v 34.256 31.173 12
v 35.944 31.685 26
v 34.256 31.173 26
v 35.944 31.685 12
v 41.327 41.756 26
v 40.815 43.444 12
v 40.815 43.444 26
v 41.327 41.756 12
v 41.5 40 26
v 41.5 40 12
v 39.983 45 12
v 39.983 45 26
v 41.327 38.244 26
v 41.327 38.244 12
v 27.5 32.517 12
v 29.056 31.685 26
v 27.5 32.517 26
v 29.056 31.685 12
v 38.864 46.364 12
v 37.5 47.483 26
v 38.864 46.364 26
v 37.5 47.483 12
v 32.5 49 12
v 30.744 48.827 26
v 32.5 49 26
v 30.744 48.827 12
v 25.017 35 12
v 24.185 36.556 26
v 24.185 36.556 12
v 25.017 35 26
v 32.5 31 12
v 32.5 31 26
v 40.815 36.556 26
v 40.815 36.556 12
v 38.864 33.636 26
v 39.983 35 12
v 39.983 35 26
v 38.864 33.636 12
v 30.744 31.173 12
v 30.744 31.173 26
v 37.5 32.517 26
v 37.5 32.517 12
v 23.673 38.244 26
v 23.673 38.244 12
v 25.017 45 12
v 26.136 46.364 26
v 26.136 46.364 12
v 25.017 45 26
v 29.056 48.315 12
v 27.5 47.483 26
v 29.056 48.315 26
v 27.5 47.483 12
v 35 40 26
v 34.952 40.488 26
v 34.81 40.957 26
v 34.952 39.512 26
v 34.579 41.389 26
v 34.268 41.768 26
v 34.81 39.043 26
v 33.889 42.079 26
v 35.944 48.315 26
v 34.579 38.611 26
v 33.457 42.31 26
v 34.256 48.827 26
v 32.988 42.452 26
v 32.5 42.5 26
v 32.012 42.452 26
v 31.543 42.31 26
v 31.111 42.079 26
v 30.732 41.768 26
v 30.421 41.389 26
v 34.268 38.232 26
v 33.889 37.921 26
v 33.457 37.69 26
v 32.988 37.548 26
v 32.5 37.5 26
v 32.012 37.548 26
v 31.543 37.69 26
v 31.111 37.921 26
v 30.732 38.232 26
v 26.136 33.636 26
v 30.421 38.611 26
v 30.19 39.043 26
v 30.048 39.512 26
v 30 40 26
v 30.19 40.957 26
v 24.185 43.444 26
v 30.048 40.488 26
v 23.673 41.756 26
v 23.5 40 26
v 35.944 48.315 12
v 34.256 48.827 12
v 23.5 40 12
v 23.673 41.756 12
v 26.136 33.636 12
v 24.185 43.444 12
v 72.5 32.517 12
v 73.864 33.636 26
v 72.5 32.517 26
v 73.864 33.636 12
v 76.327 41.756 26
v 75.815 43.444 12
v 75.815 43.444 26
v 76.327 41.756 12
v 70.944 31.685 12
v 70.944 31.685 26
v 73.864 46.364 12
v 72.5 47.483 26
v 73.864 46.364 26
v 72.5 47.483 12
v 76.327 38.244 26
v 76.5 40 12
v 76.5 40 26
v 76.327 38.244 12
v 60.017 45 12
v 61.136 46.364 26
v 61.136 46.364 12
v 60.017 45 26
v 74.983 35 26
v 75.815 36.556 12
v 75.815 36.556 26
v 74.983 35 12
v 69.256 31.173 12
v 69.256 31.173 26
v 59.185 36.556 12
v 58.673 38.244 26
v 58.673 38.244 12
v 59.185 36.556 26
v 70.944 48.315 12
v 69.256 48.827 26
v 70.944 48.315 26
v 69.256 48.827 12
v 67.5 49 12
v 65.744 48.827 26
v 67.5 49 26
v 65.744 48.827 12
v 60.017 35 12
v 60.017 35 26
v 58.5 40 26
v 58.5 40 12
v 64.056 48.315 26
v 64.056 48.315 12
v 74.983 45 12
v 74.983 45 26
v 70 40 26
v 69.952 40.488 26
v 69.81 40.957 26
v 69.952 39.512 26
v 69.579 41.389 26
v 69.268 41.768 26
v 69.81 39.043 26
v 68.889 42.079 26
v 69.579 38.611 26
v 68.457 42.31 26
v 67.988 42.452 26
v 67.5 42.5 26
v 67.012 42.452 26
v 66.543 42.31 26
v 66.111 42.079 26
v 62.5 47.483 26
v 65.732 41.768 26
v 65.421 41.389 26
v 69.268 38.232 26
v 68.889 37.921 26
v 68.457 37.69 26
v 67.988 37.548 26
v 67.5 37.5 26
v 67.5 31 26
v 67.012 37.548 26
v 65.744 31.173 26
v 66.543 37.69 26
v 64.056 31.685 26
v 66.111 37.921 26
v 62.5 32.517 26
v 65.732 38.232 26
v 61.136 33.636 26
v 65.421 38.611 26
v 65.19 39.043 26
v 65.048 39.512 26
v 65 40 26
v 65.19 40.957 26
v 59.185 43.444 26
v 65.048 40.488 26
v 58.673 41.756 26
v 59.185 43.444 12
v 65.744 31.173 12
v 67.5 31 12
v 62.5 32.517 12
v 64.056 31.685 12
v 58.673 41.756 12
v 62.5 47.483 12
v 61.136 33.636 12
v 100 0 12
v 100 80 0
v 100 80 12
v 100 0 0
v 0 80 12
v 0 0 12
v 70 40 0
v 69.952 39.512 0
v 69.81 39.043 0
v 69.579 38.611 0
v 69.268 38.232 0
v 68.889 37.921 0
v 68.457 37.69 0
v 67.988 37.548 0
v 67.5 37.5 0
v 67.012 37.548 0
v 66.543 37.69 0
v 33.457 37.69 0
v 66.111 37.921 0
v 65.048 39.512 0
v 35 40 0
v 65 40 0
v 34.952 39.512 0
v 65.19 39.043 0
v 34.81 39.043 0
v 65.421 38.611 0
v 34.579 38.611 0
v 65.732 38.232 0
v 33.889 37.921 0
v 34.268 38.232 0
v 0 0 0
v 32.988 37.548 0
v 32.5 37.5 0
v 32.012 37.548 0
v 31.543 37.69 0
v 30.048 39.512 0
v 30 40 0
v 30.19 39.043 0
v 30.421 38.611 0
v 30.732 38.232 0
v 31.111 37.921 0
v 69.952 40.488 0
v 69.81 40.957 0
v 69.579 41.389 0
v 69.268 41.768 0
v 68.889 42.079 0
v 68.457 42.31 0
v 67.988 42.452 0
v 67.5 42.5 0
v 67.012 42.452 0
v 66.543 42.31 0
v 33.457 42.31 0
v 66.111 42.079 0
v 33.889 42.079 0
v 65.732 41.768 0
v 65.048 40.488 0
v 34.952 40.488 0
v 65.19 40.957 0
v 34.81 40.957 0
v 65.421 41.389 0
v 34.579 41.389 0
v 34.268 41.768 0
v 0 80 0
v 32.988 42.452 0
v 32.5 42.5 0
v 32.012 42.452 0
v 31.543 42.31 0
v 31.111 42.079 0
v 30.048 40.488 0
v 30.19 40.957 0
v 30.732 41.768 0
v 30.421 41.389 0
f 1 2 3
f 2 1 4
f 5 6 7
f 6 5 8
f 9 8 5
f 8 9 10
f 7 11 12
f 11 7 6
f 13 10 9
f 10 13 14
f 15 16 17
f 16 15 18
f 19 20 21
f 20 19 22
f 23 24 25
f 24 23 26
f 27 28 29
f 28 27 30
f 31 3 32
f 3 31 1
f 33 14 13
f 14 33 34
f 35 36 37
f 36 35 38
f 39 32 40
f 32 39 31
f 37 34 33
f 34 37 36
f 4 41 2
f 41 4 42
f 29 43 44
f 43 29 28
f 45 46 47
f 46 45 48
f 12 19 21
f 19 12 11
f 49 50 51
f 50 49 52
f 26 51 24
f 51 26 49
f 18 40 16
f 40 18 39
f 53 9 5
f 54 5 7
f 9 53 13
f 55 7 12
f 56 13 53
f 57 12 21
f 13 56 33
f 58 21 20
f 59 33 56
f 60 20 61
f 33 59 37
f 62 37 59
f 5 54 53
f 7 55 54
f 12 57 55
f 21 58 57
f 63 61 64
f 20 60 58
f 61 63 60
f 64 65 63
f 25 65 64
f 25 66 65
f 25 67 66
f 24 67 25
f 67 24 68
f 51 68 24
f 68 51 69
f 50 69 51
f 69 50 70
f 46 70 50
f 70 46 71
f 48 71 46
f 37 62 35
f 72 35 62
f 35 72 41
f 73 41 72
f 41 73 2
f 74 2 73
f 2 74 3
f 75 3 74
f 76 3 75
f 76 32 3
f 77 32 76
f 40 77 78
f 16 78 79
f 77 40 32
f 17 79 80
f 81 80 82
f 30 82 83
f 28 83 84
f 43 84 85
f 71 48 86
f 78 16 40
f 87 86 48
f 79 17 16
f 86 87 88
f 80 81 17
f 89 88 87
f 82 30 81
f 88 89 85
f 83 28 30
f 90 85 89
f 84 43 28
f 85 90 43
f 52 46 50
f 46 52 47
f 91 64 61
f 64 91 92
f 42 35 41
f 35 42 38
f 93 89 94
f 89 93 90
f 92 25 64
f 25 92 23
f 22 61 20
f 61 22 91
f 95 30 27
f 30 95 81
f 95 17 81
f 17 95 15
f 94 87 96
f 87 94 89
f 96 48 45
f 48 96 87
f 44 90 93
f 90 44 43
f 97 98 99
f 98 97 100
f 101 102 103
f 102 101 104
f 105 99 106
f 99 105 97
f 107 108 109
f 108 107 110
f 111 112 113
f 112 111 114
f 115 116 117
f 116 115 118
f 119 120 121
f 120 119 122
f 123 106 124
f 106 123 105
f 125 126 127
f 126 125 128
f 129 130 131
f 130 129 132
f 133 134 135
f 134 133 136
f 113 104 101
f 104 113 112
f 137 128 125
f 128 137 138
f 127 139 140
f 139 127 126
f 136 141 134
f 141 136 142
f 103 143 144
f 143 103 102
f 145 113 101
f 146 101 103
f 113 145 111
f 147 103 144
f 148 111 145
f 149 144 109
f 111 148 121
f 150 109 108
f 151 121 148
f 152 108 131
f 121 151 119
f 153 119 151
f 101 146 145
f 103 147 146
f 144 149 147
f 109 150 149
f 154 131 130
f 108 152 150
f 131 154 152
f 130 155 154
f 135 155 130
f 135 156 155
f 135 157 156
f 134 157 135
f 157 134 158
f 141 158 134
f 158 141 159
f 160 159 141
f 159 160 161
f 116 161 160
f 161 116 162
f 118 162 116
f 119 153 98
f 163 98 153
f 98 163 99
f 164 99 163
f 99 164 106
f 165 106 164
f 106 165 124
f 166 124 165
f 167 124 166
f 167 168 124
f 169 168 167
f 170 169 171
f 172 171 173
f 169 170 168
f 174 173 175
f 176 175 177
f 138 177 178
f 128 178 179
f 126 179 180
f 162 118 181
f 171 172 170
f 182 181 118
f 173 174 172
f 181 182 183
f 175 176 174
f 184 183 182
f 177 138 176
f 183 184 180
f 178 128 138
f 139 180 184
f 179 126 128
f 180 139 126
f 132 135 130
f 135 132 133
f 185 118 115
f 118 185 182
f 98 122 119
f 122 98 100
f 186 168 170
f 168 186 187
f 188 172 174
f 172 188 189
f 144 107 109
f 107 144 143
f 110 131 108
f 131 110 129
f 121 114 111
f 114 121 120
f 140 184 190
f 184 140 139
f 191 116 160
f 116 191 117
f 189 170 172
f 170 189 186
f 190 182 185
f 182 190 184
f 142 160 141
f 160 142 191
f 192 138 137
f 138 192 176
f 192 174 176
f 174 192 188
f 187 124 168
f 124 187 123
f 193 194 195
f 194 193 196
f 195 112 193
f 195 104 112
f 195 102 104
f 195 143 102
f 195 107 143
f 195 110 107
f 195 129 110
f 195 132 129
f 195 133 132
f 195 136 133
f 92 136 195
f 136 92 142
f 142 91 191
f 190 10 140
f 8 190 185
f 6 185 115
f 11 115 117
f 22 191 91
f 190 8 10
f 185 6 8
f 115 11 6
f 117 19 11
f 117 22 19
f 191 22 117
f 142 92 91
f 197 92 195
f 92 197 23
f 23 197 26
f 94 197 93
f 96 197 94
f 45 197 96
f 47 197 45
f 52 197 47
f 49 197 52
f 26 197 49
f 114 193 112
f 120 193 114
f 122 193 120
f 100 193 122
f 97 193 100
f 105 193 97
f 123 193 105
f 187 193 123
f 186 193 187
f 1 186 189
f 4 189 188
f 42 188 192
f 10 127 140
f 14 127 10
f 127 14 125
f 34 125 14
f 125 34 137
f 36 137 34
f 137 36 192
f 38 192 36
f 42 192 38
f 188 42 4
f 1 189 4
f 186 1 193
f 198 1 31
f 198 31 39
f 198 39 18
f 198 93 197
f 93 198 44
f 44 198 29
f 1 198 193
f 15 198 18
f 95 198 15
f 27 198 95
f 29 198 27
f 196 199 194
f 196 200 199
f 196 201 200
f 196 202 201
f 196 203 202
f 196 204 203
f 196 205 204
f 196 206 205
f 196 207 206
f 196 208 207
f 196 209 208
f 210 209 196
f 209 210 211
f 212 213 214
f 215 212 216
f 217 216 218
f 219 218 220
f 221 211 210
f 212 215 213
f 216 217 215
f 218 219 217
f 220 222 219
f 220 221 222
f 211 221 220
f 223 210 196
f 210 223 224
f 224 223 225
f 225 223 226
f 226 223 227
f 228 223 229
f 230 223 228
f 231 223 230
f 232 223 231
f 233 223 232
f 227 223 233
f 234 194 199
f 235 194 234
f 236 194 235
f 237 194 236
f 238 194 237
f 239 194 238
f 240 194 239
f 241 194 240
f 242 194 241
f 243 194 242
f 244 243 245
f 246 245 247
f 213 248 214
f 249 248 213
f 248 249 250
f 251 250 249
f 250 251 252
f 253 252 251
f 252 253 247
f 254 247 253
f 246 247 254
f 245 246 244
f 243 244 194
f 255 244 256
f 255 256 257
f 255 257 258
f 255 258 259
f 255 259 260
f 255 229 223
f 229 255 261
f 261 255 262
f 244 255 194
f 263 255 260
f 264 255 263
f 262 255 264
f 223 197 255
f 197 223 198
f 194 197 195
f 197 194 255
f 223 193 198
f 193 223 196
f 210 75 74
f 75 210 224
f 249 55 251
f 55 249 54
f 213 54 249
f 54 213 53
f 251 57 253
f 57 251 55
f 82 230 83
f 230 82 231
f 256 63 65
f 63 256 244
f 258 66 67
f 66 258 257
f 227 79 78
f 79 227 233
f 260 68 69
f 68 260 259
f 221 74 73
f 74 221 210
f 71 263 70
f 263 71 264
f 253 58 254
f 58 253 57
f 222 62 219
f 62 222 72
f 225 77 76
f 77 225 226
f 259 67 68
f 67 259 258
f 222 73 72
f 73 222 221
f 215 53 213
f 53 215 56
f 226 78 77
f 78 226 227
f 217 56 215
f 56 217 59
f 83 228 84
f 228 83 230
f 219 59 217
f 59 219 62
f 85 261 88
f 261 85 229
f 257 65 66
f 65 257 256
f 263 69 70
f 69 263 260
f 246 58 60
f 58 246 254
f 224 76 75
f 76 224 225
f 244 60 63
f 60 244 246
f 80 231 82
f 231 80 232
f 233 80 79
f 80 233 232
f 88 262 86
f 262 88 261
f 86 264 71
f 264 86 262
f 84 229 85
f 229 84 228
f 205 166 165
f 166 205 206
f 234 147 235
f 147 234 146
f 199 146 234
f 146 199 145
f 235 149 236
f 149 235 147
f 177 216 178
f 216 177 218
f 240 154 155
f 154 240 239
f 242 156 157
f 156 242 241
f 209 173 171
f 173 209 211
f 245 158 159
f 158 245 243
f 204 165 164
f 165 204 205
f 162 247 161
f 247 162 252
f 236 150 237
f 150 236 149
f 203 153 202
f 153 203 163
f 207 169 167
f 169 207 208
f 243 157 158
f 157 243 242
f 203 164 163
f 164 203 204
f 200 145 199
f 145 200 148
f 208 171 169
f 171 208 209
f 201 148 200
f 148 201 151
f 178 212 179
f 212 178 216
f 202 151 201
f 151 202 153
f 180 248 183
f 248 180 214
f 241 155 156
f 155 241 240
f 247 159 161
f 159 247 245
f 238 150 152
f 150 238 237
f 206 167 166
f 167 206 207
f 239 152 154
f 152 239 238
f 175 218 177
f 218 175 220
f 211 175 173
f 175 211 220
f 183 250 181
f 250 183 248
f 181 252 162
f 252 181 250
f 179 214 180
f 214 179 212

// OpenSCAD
$fn = 32;

// ----------------------------------------------------------------------
// Drill jig: two_boss jig
// ----------------------------------------------------------------------

// --- parameters (mm) ---
plate_l = 100;            // plate length, X
plate_w = 80;             // plate width, Y
plate_t = 12;             // plate thickness
boss_d = 18;              // guide boss diameter
boss_h = 15;              // boss height above the plate
guide_d = 5;              // guide hole diameter
boss_pitch = 35;          // boss pitch

n_boss = 2;  // guide bosses
boss_x0 = (plate_l - (n_boss - 1) * boss_pitch) / 2;  // first boss X
boss_top = plate_t - 1 + boss_h;  // boss crown height
total_h = boss_top;  // overall height

difference() {
  union() {
  cube([plate_l, plate_w, plate_t]);
  for (i = [0 : n_boss - 1])
    translate([boss_x0 + i * boss_pitch, plate_w / 2, plate_t - 1])
      cylinder(h = boss_h, d = boss_d);
  }
  for (i = [0 : n_boss - 1])
    translate([boss_x0 + i * boss_pitch, plate_w / 2, -1])
      cylinder(h = plate_t + boss_h, d = guide_d);
}
